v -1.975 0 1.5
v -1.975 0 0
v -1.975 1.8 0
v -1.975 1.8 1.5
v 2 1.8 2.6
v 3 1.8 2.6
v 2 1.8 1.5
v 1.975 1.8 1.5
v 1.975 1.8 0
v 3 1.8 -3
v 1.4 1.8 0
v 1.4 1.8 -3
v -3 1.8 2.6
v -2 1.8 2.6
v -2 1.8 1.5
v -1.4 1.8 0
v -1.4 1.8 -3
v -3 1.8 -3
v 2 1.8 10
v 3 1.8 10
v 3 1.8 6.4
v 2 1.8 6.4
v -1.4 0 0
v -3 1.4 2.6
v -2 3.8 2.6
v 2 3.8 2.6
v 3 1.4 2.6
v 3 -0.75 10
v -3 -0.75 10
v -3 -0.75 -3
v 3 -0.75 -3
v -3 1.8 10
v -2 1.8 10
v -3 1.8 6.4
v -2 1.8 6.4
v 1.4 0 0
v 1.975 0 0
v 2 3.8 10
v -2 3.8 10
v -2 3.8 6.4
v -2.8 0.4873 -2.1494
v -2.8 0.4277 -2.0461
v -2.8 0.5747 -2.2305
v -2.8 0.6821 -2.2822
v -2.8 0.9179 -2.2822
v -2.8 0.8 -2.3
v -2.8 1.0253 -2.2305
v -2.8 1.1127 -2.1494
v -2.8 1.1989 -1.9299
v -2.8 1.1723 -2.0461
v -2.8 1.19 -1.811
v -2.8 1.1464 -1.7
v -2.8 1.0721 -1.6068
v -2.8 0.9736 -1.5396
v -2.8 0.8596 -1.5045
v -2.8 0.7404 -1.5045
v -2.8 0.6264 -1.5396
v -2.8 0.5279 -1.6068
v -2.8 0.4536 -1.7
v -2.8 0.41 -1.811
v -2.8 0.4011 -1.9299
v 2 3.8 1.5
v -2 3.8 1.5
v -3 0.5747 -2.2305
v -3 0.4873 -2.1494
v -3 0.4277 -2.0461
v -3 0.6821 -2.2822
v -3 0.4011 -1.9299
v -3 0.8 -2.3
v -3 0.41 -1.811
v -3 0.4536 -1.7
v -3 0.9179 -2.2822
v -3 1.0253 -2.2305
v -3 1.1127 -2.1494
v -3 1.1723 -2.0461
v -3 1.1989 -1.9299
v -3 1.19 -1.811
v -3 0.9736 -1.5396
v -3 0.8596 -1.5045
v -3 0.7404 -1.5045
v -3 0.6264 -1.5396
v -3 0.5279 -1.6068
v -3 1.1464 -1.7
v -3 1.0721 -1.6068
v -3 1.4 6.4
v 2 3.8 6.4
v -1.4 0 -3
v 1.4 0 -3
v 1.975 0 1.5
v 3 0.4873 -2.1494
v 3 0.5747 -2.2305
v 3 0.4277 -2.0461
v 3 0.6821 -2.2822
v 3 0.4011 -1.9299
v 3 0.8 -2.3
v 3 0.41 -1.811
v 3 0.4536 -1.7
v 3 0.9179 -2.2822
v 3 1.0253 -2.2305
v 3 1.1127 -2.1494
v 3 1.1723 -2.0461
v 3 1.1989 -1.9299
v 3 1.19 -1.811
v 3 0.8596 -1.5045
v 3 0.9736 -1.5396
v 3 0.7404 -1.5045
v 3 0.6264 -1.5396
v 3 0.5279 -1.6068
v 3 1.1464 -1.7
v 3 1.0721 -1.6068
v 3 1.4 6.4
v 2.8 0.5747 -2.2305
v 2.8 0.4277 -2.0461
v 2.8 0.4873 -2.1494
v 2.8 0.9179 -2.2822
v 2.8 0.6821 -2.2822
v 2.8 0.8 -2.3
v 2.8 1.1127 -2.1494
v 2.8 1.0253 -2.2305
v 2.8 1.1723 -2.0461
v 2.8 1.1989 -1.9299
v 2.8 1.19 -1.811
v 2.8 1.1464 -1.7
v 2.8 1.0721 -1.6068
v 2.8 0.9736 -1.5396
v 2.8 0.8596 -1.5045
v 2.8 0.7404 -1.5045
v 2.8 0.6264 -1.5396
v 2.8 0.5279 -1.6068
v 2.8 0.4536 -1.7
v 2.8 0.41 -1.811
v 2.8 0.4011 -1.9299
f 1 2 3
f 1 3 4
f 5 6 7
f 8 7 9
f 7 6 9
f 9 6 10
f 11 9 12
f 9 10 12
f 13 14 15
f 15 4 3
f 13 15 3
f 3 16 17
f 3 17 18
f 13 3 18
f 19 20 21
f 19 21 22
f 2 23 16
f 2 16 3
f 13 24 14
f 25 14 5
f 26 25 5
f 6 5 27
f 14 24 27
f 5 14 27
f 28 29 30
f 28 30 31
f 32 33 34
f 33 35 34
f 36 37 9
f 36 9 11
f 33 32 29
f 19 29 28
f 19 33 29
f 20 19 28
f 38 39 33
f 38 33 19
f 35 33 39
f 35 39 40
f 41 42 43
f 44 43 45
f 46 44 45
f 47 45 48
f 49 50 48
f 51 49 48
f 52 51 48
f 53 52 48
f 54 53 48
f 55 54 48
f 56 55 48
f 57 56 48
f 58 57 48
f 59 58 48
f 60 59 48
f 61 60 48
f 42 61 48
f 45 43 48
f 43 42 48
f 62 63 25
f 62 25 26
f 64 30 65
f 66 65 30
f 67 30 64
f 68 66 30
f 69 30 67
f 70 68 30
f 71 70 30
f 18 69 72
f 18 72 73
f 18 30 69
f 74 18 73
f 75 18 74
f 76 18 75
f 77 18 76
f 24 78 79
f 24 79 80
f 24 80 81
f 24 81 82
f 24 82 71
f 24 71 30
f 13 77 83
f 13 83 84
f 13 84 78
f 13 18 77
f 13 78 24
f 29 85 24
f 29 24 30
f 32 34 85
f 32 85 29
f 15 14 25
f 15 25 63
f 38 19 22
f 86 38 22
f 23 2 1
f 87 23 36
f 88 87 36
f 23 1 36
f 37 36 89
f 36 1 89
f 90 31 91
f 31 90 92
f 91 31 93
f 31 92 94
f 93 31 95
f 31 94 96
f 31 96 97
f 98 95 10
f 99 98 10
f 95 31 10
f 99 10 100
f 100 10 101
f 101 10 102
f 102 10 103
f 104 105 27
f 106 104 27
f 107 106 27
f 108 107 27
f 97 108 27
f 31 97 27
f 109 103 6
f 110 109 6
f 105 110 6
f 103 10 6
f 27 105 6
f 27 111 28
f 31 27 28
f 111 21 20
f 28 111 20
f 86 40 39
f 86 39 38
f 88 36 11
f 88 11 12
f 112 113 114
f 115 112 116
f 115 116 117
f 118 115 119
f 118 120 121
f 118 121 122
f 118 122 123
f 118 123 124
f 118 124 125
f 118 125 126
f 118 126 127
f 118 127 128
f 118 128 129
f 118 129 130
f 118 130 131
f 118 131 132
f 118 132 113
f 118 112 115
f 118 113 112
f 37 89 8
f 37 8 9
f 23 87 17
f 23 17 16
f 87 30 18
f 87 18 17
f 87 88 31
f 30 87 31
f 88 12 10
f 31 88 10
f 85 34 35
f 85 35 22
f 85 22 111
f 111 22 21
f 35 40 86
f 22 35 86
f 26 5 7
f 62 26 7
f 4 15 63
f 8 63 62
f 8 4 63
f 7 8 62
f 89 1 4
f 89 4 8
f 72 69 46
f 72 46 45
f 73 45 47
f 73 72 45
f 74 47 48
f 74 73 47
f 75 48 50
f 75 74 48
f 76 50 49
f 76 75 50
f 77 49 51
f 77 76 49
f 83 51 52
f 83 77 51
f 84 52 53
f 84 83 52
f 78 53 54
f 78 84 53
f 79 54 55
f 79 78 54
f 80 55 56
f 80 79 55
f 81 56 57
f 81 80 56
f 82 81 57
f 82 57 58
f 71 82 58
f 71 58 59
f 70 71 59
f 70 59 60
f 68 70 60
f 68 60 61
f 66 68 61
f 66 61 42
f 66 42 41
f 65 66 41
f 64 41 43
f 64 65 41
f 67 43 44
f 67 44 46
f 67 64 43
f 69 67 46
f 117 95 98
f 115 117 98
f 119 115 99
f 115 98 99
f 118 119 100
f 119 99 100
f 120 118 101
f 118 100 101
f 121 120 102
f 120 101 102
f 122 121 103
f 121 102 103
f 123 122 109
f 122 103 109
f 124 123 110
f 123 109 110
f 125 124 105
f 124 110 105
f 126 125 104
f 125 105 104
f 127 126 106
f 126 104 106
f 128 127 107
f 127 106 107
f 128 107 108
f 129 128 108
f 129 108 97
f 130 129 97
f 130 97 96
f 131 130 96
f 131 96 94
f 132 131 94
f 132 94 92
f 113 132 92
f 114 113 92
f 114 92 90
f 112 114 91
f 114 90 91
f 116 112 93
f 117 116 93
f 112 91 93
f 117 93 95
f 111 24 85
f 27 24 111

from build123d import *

# Parameters (mm, degrees)
BOSS_EXTRUDE1_DEPTH = 1.8
SKETCH2_W           = 6
SKETCH2_H           = 13
BOSS_EXTRUDE2_DEPTH = 0.75
SKETCH7_W           = 6
SKETCH7_H           = 3.8
CUT_EXTRUDE2_DEPTH  = 0.4
SKETCH9_R           = 0.4
CUT_EXTRUDE4_DEPTH  = 0.2
SKETCH10_W          = 4
SKETCH10_H          = 1.1
SKETCH10_H_2        = 3.6
BOSS_EXTRUDE3_DEPTH = 2


with BuildPart() as part:
    # Sketch1 → Boss-Extrude1 (new body)
    with BuildSketch(Plane(origin=(0, 0, 0), x_dir=(1, 0, 0), z_dir=(0, 1, 0))):
        Polygon((-1.4, 3), (-1.4, 0), (-1.975, 0), (-1.975, -1.5), (1.975, -1.5), (1.975, 0), (1.4, 0), (1.4, 3), (3, 3), (3, -10), (-3, -10), (-3, 3), align=None)
    extrude(amount=BOSS_EXTRUDE1_DEPTH)

    # Sketch2 → Boss-Extrude2 (add)
    with BuildSketch(Plane.XZ):
        with Locations((0, 3.5)):
            Rectangle(SKETCH2_W, SKETCH2_H)
    extrude(amount=BOSS_EXTRUDE2_DEPTH)

    # Sketch7 → Cut-Extrude2 (cut)
    with BuildSketch(Plane(origin=(0, 1.8, 0), x_dir=(1, 0, 0), z_dir=(0, 1, 0))):
        with Locations((0, -4.5)):
            Rectangle(SKETCH7_W, SKETCH7_H)
    extrude(amount=-CUT_EXTRUDE2_DEPTH, mode=Mode.SUBTRACT)

    # Sketch9 → Cut-Extrude4 (cut)
    with BuildSketch(Plane(origin=(3, 0, 0), x_dir=(0, 0, -1), z_dir=(1, 0, 0))):
        with Locations((1.9, 0.8)):
            Circle(SKETCH9_R)
    cut_extrude4 = extrude(amount=-CUT_EXTRUDE4_DEPTH, mode=Mode.SUBTRACT)

    # Mirror1: Cut-Extrude4 across plane
    add(cut_extrude4.mirror(Plane(origin=(0, 0, 0), x_dir=(0, 0, 1), z_dir=(1, 0, 0))), mode=Mode.SUBTRACT)

    # Sketch10 → Boss-Extrude3 (add)
    with BuildSketch(Plane(origin=(0, 1.8, 0), x_dir=(1, 0, 0), z_dir=(0, 1, 0))):
        with Locations((0, -2.05)):
            Rectangle(SKETCH10_W, SKETCH10_H)
        with Locations((0, -8.2)):
            Rectangle(SKETCH10_W, SKETCH10_H_2)
    extrude(amount=BOSS_EXTRUDE3_DEPTH)


solid = part.part
